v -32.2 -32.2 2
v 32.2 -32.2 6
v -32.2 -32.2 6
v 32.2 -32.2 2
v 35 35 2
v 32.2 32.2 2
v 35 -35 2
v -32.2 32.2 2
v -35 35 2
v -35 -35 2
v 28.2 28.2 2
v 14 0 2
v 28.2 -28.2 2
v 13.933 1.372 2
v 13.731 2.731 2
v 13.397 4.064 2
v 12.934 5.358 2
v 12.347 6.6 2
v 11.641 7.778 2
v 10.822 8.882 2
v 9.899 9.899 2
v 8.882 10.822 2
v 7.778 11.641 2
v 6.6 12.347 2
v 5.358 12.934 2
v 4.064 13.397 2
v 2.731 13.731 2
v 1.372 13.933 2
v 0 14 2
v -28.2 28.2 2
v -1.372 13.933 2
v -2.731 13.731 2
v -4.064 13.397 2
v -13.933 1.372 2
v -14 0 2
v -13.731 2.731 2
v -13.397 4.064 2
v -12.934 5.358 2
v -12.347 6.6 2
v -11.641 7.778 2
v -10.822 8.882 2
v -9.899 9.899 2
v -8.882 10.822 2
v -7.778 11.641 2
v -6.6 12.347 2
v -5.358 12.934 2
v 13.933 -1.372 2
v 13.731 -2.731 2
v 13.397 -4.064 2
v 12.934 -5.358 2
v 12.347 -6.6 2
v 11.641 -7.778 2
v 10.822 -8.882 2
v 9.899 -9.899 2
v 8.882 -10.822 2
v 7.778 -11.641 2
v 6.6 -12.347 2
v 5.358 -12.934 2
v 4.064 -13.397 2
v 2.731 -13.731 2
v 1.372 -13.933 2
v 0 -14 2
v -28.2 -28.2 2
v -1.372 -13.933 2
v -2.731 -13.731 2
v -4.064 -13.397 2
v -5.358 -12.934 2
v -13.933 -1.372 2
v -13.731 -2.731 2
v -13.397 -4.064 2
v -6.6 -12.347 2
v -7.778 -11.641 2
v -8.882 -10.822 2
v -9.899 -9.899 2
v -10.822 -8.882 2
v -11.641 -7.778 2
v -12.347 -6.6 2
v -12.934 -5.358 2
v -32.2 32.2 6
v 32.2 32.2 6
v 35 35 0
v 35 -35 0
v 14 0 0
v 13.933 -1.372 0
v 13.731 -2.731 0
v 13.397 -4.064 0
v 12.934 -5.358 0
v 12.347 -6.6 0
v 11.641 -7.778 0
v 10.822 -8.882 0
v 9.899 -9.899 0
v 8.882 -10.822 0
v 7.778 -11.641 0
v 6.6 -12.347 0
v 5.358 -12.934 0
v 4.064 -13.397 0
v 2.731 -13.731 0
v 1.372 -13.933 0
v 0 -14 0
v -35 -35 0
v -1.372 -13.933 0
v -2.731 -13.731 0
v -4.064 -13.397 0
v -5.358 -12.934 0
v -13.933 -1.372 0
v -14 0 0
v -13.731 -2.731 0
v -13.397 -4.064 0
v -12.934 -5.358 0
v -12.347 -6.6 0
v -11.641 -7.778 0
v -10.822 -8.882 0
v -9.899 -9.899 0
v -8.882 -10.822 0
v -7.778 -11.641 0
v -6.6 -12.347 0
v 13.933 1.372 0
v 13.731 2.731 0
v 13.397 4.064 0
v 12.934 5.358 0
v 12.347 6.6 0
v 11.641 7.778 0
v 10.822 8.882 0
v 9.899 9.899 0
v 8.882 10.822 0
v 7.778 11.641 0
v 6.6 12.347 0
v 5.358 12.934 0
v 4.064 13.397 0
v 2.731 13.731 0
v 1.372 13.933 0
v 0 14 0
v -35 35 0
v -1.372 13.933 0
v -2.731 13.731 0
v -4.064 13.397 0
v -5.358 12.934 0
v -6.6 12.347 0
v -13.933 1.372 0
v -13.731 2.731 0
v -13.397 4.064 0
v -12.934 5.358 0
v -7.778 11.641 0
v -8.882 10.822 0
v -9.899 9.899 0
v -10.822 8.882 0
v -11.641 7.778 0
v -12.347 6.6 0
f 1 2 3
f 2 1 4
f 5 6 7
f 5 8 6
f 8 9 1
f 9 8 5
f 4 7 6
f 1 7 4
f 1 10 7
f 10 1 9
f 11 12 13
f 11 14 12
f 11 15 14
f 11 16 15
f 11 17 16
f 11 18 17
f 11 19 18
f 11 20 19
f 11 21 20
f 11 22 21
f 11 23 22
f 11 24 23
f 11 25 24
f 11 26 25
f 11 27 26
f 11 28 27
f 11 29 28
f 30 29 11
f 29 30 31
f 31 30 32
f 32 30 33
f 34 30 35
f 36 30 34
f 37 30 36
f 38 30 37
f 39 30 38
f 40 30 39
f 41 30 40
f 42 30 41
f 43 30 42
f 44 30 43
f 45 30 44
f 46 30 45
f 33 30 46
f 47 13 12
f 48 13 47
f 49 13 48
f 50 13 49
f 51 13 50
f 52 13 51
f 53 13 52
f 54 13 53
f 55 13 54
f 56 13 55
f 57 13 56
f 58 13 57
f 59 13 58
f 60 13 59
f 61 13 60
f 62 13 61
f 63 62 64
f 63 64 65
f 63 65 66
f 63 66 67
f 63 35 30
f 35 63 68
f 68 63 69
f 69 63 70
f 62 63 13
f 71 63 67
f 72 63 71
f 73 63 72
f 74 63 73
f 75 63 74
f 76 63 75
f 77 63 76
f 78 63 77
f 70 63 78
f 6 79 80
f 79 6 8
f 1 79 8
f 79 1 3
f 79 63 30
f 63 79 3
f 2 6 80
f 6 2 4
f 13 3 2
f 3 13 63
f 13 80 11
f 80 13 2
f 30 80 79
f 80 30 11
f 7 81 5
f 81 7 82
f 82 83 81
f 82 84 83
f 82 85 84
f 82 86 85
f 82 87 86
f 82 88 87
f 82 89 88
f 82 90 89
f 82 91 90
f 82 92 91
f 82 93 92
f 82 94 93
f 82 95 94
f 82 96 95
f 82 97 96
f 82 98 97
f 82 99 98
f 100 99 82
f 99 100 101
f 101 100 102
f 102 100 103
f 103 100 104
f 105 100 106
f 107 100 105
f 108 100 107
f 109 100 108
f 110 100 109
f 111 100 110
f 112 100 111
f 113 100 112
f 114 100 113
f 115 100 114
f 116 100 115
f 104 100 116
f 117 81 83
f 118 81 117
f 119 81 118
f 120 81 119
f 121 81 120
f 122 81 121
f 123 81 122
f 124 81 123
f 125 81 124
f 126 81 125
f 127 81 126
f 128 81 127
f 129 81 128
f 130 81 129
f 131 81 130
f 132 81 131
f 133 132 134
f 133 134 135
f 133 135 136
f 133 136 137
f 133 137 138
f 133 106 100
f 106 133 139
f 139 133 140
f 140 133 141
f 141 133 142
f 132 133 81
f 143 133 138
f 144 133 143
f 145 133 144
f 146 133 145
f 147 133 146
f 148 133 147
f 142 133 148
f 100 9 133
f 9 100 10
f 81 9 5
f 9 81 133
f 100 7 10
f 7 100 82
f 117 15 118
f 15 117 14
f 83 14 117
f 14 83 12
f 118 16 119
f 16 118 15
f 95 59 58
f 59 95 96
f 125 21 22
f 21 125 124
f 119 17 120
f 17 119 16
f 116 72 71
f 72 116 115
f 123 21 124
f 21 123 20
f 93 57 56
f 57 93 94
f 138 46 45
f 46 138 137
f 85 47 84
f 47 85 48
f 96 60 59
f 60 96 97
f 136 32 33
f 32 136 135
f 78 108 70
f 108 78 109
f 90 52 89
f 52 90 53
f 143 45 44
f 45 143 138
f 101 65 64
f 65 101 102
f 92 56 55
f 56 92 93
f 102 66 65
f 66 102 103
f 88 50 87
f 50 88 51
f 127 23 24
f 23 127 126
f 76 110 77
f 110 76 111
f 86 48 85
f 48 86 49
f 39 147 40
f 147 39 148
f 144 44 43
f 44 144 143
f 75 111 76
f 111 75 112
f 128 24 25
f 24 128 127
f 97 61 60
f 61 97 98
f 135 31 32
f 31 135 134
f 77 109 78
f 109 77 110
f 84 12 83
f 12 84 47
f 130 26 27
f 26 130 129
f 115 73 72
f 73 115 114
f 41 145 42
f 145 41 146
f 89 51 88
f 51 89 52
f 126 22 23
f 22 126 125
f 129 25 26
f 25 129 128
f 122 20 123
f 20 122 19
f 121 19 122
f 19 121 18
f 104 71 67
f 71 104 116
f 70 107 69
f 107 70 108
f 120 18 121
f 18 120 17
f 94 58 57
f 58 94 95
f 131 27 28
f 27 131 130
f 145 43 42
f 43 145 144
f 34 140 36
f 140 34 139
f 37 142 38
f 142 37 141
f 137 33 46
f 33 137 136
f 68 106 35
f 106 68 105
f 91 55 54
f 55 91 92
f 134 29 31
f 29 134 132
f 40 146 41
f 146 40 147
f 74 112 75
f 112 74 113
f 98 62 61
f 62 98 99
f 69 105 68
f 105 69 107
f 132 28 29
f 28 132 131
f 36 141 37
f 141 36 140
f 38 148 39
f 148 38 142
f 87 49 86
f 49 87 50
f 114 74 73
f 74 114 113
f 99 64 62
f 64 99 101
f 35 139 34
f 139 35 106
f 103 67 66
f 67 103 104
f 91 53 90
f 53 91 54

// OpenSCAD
// file: Valve_Vars.scad
innerHeight=20;
outerWidth=70;
latchWidth=15;

baseThickness=2;
wallThickness=2.4;
backgroundLatchThickness=4;

pipeDiameter=28;

wallSpace=0.4;

totalWidth=outerWidth+2*latchWidth;
innerWidth=outerWidth-2*wallThickness;
totalHeight=innerHeight+baseThickness;
scaleFactor=(totalWidth+2*baseThickness)/totalWidth;

backgroundLatchWidth=innerWidth-2*wallSpace;

module centerCube(w,h,z)
{
  w2=w/2;
  translate([-w2,-w2,z])
  cube([w,w,h]);
}
// main file
include <Valve_Vars.scad>

difference()
{
	union()
	{
		centerCube(outerWidth,baseThickness,0);
		
		translate([0,0,baseThickness])
		latch();
	}
	
	translate([0,0,-1])
	cylinder(d=pipeDiameter,h=baseThickness+2,$fn=64);
}

module latch()
{
	w2=backgroundLatchWidth/2;
	for(t=[[0,-1,-1],[90,1,-1],[180,1,1],[270,-1,1]])
	translate([t[1]*w2,t[2]*w2,0])
	rotate([0,0,t[0]])
	linear_extrude(height=backgroundLatchThickness,scale=[0,1])
	square([backgroundLatchThickness,backgroundLatchWidth]);
}
